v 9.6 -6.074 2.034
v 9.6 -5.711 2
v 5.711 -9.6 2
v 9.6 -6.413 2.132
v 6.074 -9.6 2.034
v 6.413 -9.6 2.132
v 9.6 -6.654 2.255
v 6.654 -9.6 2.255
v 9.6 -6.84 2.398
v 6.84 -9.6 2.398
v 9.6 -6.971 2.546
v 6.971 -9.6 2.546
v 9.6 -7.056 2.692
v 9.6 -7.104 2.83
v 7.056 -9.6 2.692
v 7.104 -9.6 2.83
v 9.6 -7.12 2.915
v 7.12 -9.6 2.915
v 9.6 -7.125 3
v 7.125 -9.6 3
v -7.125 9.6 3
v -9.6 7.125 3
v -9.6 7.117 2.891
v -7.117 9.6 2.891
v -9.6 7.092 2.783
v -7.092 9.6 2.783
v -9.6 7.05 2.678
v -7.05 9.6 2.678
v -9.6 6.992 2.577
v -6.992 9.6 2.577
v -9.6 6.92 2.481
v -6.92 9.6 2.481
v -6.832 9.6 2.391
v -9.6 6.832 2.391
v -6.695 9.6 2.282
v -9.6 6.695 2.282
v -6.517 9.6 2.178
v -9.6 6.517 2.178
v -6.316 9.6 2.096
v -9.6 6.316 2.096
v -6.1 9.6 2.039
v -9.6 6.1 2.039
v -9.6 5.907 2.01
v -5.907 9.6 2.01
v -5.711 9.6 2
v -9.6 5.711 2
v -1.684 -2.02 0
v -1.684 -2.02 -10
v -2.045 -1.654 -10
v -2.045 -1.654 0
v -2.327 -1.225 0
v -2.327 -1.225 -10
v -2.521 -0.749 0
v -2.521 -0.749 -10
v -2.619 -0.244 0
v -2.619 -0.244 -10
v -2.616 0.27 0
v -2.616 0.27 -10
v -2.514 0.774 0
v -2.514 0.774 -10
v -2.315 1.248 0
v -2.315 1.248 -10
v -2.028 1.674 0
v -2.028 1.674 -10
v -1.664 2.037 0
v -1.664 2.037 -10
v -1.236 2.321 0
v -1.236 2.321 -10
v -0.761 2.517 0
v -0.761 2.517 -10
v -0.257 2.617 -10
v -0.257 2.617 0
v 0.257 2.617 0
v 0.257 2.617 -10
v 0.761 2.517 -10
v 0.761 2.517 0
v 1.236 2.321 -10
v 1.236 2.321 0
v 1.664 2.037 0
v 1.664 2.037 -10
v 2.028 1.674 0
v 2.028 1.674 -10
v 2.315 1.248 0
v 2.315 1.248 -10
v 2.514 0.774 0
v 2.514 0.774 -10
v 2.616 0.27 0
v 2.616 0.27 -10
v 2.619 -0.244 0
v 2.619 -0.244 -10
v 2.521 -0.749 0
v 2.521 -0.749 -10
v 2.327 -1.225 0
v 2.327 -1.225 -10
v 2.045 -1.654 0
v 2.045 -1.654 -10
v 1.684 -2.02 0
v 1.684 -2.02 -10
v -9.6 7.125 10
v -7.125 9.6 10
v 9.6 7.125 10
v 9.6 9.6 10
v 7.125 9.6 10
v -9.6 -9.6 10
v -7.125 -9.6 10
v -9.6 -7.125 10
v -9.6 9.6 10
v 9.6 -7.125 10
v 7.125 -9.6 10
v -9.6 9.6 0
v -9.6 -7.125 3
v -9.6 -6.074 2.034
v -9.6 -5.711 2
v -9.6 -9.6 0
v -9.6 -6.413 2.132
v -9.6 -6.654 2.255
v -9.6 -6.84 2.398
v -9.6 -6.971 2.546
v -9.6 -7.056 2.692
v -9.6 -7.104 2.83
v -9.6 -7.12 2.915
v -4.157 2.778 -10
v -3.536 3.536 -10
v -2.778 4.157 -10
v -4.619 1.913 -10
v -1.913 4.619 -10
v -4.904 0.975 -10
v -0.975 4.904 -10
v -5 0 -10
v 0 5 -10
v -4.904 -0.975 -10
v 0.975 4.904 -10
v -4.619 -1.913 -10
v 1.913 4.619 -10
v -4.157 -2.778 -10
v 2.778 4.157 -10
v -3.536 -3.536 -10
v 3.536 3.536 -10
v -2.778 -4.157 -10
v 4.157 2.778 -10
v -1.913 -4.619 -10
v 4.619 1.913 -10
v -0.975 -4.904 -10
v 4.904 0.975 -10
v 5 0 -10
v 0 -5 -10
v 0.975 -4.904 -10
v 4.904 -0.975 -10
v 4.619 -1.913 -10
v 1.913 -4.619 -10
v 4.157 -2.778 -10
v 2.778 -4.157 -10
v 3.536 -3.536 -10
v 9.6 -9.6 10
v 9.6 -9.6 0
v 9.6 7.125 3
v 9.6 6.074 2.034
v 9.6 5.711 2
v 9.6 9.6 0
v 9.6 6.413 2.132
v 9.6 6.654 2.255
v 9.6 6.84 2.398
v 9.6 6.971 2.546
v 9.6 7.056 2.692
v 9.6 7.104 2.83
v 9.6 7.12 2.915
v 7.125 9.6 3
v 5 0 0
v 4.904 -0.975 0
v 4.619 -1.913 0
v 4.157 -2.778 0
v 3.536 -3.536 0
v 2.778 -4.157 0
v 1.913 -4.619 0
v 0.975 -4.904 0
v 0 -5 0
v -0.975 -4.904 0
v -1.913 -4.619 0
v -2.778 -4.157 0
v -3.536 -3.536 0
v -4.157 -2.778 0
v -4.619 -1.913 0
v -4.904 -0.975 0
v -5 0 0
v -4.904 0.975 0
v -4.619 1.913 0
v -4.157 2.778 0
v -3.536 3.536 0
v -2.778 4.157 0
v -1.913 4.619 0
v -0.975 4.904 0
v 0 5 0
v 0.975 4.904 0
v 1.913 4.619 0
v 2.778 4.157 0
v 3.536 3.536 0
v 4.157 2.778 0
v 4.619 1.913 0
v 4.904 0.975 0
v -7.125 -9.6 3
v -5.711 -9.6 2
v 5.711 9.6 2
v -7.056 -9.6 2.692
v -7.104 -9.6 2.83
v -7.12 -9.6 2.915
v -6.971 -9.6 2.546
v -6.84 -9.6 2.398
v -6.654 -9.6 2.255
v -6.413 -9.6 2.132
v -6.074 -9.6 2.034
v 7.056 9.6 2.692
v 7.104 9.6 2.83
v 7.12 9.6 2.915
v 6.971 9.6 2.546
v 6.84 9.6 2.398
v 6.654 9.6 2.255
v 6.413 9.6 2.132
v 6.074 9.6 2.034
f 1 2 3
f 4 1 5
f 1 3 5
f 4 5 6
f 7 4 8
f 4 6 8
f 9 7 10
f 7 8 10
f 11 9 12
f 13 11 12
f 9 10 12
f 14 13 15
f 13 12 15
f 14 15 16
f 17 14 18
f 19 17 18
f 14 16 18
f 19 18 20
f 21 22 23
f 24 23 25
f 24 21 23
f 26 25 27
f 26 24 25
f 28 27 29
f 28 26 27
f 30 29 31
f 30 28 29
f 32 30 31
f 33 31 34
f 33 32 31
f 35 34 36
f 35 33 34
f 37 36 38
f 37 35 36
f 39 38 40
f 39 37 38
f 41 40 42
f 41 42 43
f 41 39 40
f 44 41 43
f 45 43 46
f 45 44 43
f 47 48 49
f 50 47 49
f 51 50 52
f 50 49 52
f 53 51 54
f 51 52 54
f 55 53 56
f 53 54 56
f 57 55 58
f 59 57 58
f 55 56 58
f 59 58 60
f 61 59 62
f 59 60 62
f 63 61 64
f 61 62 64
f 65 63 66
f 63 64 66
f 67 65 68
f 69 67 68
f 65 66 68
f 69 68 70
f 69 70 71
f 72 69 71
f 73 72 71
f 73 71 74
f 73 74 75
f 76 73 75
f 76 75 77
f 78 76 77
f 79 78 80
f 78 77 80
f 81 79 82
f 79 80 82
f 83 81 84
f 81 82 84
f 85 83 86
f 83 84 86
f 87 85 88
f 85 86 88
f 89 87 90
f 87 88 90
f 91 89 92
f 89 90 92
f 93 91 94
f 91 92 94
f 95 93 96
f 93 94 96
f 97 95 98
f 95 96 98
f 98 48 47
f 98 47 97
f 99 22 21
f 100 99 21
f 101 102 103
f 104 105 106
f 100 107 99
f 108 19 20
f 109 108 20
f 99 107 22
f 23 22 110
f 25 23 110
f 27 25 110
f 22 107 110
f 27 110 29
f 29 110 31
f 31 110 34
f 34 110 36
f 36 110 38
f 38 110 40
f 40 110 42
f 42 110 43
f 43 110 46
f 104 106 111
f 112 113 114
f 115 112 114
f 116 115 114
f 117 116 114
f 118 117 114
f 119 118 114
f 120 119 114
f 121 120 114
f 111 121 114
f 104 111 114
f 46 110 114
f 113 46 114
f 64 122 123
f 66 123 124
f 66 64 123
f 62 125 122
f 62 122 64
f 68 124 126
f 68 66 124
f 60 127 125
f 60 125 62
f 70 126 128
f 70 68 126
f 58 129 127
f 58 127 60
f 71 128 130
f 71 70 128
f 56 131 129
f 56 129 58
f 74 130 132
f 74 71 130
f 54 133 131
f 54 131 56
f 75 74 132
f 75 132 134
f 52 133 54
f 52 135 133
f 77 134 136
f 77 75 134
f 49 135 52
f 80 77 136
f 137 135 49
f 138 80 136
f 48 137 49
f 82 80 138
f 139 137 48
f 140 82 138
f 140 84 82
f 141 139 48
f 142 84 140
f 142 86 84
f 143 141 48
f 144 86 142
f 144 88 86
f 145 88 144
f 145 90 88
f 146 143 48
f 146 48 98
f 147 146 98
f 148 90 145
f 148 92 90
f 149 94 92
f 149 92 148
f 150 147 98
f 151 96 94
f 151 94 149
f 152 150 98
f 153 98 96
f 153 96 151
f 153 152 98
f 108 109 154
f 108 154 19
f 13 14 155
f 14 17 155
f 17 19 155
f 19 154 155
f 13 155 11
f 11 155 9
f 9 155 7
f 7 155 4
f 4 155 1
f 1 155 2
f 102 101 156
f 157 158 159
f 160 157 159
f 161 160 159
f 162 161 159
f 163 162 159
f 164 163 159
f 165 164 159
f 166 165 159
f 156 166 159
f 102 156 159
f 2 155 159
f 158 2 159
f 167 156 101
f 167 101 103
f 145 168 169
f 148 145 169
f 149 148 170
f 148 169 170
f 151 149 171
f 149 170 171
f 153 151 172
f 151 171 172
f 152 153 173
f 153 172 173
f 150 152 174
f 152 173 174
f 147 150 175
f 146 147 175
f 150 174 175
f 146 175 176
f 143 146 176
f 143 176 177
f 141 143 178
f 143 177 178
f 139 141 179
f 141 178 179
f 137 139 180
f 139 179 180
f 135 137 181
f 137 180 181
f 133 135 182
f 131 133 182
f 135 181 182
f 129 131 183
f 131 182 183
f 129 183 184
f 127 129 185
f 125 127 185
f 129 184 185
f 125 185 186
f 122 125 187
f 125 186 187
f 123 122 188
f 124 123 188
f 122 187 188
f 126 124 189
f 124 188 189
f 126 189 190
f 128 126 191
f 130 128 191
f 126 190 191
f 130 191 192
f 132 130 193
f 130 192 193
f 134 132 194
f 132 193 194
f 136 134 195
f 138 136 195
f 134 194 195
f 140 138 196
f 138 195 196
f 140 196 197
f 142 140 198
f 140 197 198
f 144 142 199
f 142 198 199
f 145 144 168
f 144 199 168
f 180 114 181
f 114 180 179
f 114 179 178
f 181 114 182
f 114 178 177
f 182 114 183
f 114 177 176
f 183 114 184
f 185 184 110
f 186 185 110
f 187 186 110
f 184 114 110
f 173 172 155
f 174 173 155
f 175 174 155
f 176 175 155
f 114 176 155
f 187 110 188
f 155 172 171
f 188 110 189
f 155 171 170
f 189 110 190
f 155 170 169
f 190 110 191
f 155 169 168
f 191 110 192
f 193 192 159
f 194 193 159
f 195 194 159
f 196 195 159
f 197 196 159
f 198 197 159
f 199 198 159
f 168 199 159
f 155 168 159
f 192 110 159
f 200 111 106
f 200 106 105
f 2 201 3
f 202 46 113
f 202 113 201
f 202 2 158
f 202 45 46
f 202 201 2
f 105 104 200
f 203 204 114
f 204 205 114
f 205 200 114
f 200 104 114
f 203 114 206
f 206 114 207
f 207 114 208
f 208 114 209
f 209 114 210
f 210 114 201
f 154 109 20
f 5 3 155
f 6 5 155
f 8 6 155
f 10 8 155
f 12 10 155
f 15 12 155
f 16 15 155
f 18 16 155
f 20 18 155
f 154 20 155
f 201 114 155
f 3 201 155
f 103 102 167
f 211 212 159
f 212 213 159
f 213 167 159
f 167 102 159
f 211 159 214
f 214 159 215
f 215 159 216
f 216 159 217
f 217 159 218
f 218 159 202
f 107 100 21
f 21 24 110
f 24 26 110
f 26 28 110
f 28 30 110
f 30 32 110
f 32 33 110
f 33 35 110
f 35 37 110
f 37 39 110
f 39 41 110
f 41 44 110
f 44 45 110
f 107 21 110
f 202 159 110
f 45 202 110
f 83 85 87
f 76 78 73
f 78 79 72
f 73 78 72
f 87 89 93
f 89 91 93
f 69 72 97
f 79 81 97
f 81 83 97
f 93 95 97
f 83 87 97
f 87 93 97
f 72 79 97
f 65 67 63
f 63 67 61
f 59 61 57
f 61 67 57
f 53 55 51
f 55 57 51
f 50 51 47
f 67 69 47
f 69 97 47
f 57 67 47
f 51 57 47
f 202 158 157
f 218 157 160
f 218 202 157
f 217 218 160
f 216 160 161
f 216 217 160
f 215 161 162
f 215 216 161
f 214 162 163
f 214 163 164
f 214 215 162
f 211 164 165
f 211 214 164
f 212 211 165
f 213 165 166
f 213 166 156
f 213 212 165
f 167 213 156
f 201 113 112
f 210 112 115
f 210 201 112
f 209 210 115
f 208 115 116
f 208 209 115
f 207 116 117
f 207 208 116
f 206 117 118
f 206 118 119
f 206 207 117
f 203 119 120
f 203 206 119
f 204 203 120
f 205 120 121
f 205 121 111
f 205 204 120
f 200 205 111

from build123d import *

# Parameters (mm, degrees)
SKETCH_W     = 19.2
SKETCH_H     = 19.2
PAD_DEPTH    = 2
PAD001_DEPTH = 8
FILLET_R     = 1
SKETCH012_R  = 5
PAD002_DEPTH = 10
POCKET_DEPTH = 10


with BuildPart() as part:
    # Sketch → Pad (new body)
    with BuildSketch(Plane.XY):
        Rectangle(SKETCH_W, SKETCH_H)
    extrude(amount=PAD_DEPTH)

    # Sketch011 → Pad001 (new body)
    with BuildSketch(Plane.XY.offset(2)):
        Polygon((-9.6, 7.125126), (-7.125126, 9.6), (-9.6, 9.6), align=None)
        Polygon((7.125126, 9.6), (9.6, 9.6), (9.6, 7.125126), align=None)
        Polygon((7.125126, -9.6), (9.6, -9.6), (9.6, -7.125126), align=None)
        Polygon((-7.125126, -9.6), (-9.6, -9.6), (-9.6, -7.125126), align=None)
    extrude(amount=PAD001_DEPTH)

    # Fillet
    fillet_edges = [part.edges().sort_by_distance(p)[0] for p in [
        (-8.362563, 8.362563, 2),
        (8.362563, 8.362563, 2),
        (8.362563, -8.362563, 2),
        (-8.362563, -8.362563, 2),
    ]]
    fillet(fillet_edges, radius=FILLET_R)

    # Sketch012 → Pad002 (new body)
    with BuildSketch(Plane(origin=(0, 0, 0), x_dir=(1, 0, 0), z_dir=(0, 0, -1))):
        Circle(SKETCH012_R)
    extrude(amount=PAD002_DEPTH)

    # Sketch008 → Pocket (cut)
    with BuildSketch(Plane(origin=(0, 0, -10), x_dir=(1, 0, 0), z_dir=(0, 0, -1))):
        with BuildLine():
            Line((-1.684191, 2.02), (1.684191, 2.02))
            ThreePointArc((-1.684191, 2.02), (0, -2.63), (1.684191, 2.02))
        make_face()
    extrude(amount=-POCKET_DEPTH, mode=Mode.SUBTRACT)


solid = part.part
